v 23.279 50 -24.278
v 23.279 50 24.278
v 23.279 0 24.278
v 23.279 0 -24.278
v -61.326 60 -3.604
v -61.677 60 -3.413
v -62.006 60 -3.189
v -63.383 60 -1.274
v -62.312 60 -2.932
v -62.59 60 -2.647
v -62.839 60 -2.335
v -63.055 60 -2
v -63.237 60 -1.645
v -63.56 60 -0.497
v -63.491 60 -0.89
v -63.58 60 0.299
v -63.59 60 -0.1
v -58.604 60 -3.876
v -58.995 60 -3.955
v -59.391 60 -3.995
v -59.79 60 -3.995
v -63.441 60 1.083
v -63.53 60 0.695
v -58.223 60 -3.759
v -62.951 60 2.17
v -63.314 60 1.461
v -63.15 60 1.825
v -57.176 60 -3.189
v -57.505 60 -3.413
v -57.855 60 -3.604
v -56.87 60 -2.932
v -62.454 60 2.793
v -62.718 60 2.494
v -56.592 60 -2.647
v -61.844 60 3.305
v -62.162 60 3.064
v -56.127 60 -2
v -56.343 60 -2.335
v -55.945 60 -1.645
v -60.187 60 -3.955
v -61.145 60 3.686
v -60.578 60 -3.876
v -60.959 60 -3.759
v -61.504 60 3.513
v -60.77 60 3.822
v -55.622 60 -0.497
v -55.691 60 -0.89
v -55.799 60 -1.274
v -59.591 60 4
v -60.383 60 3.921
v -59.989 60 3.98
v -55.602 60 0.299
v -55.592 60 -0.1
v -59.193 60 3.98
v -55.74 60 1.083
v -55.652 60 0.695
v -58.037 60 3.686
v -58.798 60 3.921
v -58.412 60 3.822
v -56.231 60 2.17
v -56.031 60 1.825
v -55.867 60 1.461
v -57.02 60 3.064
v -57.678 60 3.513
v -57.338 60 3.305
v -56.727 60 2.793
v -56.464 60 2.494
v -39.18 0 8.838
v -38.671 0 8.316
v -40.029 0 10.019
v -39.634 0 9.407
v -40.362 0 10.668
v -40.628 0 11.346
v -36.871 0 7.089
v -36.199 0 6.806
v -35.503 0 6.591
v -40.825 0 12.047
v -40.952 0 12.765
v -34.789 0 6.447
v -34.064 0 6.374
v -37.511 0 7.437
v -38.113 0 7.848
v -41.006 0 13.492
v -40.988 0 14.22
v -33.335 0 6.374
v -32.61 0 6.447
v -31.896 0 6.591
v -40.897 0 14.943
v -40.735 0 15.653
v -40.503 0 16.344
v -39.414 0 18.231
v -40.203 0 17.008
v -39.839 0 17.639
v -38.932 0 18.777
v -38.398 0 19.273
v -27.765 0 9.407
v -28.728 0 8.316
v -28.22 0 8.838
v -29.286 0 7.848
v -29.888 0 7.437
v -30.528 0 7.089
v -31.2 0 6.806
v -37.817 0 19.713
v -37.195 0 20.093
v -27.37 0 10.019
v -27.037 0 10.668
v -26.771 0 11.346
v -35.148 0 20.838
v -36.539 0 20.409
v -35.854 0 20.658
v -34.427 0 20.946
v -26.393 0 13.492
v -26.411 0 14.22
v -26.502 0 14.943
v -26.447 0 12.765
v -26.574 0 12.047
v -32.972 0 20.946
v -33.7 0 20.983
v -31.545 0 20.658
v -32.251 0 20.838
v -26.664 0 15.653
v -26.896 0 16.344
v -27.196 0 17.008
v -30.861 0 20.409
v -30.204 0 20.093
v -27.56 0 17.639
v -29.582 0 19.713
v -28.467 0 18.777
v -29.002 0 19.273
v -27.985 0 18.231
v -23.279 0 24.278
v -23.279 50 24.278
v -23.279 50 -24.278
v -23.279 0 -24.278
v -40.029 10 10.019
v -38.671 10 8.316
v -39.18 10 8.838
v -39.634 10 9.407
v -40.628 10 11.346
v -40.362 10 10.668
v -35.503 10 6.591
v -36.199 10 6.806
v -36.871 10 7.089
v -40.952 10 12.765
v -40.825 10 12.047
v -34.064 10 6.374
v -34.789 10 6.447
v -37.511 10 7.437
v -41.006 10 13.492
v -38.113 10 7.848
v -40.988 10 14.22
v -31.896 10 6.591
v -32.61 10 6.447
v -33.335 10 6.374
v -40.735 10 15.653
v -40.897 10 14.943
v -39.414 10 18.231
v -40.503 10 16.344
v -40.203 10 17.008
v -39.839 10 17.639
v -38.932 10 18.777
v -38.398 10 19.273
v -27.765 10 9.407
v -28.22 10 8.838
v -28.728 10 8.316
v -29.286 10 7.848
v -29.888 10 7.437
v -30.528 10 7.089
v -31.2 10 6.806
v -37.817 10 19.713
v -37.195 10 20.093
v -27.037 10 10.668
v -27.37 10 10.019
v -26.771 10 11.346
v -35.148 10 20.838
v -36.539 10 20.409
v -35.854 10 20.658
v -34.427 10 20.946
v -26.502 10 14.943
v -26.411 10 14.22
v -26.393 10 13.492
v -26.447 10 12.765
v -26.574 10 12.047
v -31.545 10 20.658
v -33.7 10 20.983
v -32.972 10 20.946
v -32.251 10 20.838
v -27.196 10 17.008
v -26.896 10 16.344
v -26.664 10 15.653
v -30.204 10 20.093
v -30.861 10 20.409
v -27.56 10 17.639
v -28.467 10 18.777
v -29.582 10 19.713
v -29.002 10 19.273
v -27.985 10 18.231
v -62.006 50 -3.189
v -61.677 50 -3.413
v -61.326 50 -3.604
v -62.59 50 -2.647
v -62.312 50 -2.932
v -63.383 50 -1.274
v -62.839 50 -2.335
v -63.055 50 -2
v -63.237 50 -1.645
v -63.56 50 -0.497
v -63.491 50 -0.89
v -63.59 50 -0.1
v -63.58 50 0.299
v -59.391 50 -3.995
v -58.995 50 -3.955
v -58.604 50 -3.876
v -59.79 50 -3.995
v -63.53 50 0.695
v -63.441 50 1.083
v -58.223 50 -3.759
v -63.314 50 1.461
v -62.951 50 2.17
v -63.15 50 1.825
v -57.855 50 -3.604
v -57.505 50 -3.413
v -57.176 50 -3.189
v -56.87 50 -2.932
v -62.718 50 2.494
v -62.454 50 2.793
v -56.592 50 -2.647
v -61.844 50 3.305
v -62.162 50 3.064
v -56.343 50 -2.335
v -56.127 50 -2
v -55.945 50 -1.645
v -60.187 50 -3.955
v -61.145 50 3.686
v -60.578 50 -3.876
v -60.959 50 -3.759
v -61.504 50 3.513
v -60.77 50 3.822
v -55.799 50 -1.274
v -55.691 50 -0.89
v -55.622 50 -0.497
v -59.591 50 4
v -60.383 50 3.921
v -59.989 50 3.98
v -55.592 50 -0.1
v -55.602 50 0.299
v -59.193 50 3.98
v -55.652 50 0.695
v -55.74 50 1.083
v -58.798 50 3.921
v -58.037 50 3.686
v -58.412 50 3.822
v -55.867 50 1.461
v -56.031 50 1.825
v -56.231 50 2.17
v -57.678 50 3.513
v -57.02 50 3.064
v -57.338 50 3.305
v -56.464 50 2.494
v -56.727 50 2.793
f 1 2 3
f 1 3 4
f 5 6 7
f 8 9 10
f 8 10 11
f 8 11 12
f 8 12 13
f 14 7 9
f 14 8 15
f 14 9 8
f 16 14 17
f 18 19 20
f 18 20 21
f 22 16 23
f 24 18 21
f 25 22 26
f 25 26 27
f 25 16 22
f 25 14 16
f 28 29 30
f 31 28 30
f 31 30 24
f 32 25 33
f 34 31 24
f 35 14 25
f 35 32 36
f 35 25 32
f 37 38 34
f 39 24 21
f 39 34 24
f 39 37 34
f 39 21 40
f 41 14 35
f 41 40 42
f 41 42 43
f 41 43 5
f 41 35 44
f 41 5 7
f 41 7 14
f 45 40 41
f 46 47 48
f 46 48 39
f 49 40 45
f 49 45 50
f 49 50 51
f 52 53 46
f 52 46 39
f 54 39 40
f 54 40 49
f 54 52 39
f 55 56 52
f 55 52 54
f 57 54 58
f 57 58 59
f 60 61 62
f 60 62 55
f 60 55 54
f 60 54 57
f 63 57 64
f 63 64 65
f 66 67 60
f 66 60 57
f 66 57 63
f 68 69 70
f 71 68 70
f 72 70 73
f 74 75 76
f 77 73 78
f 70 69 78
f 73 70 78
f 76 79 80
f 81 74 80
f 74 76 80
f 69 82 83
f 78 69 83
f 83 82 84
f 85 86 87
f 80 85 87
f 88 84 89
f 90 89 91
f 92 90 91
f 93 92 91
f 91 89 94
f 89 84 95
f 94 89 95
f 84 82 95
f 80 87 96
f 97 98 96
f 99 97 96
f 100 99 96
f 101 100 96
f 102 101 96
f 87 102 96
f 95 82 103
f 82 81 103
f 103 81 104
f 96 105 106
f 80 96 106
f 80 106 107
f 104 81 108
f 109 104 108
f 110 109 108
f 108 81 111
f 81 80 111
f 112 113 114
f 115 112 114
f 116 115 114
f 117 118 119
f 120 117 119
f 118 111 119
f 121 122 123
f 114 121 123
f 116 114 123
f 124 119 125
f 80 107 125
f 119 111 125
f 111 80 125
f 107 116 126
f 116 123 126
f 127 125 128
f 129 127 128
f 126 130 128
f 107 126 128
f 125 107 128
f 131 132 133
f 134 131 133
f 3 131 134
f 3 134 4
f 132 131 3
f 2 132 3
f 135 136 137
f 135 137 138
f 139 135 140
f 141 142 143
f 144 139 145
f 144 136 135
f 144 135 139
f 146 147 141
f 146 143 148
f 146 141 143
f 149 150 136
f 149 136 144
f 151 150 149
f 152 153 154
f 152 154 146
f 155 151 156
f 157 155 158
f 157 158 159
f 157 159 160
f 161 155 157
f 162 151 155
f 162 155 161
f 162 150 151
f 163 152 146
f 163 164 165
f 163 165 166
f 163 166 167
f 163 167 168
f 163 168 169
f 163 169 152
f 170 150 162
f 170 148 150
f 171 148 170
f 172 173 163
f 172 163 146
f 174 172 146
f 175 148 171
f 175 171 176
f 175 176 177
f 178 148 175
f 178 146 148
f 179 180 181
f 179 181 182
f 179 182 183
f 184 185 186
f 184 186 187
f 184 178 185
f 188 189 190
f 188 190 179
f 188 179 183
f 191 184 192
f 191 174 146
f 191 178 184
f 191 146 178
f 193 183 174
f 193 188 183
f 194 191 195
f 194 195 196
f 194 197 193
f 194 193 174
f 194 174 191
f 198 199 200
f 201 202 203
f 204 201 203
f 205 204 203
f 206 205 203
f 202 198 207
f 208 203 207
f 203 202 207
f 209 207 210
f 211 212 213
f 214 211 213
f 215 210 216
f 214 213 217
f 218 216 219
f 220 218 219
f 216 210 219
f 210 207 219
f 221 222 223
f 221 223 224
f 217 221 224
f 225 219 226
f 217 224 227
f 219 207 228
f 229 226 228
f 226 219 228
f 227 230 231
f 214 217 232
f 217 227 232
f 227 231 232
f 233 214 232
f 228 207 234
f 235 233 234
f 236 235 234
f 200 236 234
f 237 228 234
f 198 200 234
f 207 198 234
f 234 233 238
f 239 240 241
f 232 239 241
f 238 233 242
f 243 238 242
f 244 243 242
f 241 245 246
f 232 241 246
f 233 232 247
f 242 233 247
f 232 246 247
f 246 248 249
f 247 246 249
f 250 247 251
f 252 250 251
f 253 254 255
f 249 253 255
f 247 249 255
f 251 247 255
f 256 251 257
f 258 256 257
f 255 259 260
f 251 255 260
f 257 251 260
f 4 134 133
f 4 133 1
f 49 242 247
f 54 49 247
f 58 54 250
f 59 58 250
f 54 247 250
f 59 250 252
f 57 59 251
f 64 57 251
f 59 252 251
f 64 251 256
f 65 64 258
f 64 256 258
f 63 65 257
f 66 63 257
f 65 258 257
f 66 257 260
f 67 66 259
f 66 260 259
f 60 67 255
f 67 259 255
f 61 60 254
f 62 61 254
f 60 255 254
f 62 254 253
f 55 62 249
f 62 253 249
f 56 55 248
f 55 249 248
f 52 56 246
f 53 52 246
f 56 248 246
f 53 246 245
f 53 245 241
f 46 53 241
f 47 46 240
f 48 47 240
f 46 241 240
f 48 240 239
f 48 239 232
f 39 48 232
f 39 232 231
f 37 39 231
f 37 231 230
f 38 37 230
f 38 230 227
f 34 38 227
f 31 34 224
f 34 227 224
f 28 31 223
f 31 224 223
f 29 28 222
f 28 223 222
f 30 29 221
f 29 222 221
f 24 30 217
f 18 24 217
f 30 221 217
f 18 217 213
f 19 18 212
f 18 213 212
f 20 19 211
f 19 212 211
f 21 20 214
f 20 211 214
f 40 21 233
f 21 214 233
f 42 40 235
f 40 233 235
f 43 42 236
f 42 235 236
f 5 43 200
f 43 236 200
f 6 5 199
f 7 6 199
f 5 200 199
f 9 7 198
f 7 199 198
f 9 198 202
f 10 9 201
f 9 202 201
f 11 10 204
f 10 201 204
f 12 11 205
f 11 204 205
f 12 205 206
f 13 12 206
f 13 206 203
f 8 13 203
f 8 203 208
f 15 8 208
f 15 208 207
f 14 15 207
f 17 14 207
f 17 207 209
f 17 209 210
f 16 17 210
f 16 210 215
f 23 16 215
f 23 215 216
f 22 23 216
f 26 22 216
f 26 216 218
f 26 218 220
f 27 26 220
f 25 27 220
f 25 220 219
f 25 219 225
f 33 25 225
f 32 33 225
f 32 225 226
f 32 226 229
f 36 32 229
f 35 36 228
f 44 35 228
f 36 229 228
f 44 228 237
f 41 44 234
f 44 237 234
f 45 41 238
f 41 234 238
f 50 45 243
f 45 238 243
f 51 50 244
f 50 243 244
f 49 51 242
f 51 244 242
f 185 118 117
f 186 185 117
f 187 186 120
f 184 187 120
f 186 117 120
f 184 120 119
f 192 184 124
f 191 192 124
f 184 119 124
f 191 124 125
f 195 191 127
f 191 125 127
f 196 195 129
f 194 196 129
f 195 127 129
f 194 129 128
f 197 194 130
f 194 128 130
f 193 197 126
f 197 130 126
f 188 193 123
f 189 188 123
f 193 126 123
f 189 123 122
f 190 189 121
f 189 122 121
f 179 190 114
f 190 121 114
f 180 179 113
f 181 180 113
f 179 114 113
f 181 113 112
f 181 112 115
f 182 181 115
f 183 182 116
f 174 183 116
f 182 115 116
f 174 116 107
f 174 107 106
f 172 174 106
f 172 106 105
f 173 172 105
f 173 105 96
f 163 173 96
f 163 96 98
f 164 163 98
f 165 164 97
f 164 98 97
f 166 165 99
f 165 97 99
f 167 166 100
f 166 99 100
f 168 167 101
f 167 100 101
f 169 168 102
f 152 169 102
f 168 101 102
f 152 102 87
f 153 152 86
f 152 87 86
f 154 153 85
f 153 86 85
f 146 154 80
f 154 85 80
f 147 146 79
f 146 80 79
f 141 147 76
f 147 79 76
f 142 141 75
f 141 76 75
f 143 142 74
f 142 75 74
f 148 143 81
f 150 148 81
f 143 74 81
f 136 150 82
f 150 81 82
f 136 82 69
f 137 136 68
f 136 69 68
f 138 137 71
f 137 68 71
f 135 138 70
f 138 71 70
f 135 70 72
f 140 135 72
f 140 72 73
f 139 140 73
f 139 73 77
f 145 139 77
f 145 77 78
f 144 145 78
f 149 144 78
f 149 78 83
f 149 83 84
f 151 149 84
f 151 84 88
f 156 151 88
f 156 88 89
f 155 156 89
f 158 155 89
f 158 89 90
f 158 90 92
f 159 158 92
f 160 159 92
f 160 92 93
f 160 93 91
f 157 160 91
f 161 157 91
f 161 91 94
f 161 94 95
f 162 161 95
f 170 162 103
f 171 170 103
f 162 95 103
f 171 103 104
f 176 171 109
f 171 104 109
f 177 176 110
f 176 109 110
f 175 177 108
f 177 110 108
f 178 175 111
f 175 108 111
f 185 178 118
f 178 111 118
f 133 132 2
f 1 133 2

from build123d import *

# Parameters (mm, degrees)
SKETCH_1_W      = 46.55787774
SKETCH_1_H      = 48.556217662
EXTRUDE_1_DEPTH = 50
SKETCH_2_R      = 7.308846902
EXTRUDE_2_DEPTH = 10
SKETCH_3_R      = 4
EXTRUDE_3_DEPTH = 10


with BuildPart() as part:
    # 草图1 → 凸台-拉伸1 (new body)
    with BuildSketch(Plane(origin=(0, 0, 0), x_dir=(1, 0, 0), z_dir=(0, 1, 0))):
        Rectangle(SKETCH_1_W, SKETCH_1_H)
    extrude(amount=EXTRUDE_1_DEPTH)


with BuildPart() as body_2:
    # 草图2 → 凸台-拉伸2 (new body)
    with BuildSketch(Plane(origin=(0, 0, 0), x_dir=(1, 0, 0), z_dir=(0, 1, 0))):
        with Locations(Location((-33.699554643, -13.673728025, 0), (0, 0, 270))):
            Circle(SKETCH_2_R)
    extrude(amount=EXTRUDE_2_DEPTH)


with BuildPart() as body_3:
    # 草图3 → 凸台-拉伸3 (new body)
    with BuildSketch(Plane(origin=(0, 50, 0), x_dir=(1, 0, 0), z_dir=(0, 1, 0))):
        with Locations(Location((-59.590874547, 0, 0), (0, 0, 270))):
            Circle(SKETCH_3_R)
    extrude(amount=EXTRUDE_3_DEPTH)


solid = Compound([part.part, body_2.part, body_3.part])
